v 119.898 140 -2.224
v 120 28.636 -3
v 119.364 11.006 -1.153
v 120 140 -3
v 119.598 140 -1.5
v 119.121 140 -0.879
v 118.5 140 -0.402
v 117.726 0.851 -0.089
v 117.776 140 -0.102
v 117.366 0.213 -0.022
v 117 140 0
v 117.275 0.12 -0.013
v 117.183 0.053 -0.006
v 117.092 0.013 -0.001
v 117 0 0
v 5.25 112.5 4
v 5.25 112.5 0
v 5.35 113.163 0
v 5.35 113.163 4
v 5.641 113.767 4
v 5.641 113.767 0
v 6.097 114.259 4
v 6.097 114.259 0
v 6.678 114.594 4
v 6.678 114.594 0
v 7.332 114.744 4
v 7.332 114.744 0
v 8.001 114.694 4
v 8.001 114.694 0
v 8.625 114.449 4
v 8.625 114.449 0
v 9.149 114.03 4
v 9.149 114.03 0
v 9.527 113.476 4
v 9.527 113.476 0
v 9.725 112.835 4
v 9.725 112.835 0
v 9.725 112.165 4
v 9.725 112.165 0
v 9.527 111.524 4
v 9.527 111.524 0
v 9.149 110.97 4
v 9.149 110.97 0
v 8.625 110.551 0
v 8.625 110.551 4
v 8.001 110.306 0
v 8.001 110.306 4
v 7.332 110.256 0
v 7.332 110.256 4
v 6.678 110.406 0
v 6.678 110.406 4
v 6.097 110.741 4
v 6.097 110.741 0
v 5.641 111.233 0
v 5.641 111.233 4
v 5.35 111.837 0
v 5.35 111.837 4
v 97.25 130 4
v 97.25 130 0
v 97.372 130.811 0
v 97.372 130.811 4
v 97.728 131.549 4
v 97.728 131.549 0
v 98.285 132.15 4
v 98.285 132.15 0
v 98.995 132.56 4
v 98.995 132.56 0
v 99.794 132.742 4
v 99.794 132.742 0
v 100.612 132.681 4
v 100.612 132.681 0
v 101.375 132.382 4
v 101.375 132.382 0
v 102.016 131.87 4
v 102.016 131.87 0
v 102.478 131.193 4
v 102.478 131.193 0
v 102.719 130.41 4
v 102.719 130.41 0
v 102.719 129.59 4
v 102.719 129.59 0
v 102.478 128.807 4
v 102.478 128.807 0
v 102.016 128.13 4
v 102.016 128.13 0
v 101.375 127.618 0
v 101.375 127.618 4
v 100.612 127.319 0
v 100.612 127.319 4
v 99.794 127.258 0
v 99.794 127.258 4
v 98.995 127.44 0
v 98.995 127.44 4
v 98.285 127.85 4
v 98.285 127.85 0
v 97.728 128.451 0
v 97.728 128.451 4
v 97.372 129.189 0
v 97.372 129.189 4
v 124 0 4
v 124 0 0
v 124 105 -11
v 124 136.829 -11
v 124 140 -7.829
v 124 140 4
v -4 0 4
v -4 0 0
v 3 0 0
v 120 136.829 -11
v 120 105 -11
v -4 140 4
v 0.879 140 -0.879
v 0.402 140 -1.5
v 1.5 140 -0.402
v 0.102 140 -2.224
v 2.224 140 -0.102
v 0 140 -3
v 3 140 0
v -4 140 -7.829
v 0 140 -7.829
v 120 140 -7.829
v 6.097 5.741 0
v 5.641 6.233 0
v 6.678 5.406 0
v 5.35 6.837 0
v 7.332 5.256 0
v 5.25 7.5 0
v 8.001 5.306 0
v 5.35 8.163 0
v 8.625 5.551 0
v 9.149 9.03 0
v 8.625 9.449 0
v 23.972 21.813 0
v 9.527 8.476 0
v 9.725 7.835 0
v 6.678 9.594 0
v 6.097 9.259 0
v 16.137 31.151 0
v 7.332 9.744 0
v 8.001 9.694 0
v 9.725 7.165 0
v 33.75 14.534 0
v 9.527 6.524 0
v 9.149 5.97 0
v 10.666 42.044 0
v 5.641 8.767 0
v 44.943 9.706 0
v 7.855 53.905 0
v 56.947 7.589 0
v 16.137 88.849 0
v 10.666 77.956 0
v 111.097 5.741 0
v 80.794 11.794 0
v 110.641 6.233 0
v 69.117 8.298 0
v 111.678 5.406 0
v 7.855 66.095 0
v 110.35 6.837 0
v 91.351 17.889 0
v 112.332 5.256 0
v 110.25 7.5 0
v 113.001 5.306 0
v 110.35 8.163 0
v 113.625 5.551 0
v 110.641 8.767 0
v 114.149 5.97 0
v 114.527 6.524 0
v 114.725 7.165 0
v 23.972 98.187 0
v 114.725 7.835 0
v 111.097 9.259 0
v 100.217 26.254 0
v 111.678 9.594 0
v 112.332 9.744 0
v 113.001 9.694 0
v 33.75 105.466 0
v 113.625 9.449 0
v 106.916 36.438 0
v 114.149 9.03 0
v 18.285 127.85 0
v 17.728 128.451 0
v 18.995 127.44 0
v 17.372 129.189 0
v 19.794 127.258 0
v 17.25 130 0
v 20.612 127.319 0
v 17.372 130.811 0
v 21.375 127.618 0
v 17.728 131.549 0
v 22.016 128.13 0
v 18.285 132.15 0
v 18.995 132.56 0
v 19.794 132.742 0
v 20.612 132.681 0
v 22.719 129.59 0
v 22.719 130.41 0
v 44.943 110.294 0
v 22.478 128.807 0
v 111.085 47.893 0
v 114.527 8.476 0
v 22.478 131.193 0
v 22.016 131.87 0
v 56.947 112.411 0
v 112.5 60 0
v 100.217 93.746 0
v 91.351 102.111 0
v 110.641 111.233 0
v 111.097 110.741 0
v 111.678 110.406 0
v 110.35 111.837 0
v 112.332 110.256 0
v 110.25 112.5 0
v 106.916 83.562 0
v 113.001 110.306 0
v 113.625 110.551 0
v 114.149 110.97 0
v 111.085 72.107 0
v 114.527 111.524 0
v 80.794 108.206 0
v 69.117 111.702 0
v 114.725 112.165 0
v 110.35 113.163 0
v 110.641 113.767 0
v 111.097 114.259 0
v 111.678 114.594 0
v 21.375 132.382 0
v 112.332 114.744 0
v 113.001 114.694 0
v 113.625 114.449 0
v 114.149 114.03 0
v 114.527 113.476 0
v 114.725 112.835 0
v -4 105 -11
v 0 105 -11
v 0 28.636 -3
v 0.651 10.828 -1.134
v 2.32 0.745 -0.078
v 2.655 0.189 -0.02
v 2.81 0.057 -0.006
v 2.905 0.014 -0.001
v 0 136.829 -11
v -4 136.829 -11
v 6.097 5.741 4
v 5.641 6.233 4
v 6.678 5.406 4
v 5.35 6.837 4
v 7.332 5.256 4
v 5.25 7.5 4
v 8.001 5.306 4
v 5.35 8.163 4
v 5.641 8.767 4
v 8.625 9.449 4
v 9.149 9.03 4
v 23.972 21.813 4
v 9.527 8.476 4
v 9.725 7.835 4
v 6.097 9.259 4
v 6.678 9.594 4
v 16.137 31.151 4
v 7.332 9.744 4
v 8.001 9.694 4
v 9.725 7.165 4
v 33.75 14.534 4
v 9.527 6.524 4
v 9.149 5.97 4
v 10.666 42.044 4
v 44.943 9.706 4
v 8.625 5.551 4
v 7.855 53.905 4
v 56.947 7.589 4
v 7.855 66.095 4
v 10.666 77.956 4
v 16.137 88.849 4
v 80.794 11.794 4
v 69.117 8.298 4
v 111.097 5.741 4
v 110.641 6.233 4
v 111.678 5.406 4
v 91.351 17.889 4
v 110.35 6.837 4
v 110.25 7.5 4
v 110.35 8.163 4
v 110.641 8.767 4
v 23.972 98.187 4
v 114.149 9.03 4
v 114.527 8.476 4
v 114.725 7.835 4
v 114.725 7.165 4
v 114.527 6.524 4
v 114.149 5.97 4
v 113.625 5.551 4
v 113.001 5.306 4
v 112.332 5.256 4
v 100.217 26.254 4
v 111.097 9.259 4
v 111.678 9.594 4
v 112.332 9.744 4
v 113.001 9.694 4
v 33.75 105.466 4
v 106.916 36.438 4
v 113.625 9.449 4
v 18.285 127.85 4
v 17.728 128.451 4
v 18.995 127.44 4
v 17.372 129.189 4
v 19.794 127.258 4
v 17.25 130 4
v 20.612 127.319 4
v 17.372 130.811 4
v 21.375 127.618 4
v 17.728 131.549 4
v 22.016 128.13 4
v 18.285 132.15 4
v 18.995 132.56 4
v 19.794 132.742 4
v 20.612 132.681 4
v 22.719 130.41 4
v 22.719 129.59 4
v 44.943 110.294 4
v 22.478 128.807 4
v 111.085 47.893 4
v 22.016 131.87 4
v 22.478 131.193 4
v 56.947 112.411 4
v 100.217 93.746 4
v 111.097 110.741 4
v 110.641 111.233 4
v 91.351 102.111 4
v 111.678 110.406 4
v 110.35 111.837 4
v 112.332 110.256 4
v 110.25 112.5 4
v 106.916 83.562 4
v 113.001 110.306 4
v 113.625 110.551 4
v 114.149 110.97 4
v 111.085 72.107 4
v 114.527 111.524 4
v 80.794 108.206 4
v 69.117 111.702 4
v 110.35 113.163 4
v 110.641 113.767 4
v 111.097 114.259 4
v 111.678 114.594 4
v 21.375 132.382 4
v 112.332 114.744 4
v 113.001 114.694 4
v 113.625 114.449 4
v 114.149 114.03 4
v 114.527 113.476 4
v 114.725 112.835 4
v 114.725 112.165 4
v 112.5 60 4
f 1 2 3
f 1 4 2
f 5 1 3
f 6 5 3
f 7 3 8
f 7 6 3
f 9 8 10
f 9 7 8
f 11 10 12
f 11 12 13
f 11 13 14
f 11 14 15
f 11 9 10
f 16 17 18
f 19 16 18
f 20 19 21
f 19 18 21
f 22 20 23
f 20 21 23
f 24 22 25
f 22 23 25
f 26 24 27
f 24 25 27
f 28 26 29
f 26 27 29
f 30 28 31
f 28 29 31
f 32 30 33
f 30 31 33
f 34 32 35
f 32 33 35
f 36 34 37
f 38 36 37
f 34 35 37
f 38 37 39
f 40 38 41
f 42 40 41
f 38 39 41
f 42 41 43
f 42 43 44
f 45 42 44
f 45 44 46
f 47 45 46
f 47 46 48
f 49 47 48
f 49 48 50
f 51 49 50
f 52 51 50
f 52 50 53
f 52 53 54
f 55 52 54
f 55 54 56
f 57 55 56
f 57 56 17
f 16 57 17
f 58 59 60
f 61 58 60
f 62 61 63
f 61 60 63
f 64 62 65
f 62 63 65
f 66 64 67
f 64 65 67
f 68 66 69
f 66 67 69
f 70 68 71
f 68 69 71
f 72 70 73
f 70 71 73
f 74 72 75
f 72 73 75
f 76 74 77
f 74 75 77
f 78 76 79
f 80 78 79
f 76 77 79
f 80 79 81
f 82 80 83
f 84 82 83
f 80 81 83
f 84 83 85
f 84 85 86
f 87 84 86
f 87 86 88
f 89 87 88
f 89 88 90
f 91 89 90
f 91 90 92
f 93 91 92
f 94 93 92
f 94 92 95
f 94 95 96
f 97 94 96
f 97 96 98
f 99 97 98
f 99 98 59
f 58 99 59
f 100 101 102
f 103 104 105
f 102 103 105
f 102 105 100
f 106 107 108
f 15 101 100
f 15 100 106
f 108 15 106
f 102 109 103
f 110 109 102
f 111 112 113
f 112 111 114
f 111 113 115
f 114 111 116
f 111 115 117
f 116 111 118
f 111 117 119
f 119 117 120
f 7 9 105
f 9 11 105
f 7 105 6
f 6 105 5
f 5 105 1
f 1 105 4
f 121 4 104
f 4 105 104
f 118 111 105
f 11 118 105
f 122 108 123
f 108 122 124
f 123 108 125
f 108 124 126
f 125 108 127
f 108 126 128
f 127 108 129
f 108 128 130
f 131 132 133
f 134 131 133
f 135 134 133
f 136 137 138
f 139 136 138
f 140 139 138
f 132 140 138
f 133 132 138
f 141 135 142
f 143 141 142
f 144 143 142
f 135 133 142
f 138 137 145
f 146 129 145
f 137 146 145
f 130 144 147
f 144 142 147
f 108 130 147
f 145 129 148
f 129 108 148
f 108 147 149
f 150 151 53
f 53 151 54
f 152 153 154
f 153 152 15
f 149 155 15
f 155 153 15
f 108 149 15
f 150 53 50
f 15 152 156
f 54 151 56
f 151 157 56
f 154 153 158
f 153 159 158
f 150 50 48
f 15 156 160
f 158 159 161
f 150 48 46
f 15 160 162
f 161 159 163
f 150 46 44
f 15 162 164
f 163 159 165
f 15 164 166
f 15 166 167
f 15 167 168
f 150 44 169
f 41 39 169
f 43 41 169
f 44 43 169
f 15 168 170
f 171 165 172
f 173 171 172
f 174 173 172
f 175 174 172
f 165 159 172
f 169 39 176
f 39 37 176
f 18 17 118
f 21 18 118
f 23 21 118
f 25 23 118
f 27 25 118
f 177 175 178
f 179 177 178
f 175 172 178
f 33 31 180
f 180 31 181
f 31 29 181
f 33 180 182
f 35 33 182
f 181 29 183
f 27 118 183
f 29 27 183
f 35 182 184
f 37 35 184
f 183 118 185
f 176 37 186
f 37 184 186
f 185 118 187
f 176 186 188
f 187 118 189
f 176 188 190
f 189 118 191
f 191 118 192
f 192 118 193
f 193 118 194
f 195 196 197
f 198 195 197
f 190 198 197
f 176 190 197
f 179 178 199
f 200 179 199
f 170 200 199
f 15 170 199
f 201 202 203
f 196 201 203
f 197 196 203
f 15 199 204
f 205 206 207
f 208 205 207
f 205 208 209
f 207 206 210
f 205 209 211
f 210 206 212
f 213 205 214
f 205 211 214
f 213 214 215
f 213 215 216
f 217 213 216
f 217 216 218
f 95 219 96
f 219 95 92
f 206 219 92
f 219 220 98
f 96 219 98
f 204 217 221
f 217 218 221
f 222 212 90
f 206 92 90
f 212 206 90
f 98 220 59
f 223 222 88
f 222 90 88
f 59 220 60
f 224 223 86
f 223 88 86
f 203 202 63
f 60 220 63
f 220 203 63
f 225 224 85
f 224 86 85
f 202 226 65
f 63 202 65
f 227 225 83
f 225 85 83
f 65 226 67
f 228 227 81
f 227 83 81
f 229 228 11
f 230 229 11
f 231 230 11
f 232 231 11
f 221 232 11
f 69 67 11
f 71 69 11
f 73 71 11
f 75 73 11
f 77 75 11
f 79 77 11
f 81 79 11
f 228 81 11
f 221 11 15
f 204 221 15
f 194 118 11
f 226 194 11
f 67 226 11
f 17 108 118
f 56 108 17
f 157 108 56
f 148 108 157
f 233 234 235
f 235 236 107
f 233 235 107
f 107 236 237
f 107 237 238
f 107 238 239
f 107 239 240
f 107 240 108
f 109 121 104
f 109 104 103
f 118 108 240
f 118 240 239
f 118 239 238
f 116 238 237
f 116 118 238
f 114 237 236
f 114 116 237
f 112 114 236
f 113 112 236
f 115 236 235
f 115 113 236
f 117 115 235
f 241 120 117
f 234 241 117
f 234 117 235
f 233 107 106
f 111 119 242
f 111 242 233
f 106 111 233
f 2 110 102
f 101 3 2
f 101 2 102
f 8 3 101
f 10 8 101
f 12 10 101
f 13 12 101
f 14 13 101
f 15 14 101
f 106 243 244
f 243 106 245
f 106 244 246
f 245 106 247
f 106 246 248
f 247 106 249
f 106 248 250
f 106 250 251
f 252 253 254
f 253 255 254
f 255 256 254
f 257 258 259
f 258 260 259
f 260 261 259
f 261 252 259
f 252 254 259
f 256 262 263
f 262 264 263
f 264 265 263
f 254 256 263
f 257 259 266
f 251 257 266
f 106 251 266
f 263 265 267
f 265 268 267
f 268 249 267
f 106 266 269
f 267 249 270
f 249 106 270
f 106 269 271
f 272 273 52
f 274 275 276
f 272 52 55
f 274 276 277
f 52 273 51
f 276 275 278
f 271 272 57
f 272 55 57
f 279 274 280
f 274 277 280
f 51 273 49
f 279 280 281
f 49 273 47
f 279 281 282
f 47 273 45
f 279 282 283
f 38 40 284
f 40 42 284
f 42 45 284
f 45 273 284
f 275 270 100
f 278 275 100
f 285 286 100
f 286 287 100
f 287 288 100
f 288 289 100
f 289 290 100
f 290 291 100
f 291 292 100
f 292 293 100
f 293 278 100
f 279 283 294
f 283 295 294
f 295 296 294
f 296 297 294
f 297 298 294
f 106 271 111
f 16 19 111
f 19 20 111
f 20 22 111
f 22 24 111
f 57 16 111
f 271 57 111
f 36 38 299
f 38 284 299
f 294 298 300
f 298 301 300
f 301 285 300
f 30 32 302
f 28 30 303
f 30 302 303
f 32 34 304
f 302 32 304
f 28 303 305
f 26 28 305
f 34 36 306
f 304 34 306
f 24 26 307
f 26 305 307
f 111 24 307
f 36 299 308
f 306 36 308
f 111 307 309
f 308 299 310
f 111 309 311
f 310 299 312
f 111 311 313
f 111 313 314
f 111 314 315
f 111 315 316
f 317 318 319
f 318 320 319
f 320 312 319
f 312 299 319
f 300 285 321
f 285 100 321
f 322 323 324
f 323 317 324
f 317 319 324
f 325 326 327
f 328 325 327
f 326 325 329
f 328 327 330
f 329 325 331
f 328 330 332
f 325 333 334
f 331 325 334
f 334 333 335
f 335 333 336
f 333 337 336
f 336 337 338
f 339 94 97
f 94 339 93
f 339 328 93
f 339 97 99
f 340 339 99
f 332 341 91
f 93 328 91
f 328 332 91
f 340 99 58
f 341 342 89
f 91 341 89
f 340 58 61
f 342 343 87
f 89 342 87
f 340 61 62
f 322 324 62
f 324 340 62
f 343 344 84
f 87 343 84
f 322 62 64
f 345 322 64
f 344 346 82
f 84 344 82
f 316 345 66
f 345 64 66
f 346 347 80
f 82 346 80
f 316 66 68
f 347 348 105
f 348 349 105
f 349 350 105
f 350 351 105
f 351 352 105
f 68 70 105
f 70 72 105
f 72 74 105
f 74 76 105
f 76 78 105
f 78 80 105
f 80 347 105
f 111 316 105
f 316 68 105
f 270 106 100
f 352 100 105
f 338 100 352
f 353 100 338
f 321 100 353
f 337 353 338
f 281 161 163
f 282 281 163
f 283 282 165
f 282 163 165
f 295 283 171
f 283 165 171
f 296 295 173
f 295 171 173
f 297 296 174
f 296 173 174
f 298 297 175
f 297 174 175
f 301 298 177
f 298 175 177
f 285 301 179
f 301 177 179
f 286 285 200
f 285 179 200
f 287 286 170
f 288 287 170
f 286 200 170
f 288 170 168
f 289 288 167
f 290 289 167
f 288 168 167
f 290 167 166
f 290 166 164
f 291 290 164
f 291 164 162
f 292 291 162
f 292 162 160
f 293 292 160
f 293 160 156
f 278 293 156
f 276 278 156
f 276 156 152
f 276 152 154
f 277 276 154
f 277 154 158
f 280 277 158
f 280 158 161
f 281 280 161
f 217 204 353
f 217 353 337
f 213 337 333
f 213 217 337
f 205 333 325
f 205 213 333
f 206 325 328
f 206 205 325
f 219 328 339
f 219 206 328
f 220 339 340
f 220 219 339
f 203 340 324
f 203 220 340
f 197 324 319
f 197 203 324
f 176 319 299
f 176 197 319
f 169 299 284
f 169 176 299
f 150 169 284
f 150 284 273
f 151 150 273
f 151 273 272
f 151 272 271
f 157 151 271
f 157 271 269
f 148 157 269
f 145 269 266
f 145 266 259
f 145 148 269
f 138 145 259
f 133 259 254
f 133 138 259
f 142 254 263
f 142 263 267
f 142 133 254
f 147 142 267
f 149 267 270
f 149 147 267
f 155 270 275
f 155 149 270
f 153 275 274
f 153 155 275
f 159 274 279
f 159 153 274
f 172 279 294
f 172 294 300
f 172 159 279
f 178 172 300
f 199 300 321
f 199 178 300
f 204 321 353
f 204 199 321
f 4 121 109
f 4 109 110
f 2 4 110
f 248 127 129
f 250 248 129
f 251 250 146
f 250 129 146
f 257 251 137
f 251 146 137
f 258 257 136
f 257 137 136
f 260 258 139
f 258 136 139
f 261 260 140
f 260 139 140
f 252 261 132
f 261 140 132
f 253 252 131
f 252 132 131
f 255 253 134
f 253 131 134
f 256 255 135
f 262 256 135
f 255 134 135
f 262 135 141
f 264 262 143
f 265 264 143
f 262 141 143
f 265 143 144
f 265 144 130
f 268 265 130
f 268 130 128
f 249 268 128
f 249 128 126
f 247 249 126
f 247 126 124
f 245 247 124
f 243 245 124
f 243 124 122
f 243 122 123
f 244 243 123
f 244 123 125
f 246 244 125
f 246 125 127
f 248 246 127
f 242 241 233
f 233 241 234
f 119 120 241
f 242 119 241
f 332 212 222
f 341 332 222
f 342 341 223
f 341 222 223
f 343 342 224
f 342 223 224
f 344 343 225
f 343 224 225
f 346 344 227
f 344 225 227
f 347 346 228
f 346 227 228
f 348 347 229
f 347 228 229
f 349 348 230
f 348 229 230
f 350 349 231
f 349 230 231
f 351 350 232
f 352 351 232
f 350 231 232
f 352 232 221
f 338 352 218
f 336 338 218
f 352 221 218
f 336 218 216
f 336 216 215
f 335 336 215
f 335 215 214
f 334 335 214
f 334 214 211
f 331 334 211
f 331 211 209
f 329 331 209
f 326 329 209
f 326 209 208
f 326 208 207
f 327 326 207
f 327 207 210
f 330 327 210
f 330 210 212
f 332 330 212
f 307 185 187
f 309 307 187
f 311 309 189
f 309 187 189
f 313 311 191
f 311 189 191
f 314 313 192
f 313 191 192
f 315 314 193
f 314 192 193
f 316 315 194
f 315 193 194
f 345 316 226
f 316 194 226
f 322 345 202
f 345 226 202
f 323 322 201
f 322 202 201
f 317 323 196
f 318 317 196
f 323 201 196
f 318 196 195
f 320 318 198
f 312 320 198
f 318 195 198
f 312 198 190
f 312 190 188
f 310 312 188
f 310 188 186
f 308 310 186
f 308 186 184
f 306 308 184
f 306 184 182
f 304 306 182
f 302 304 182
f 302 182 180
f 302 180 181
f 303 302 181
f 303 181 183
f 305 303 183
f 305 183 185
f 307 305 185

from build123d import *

# Parameters (mm, degrees)
SKETCH1_W            = 120
SKETCH1_H            = 140
SKETCH1_R            = 52.5
BOSS_EXTRUDE1_DEPTH  = 4
M4_CLEARANCE_HOLE1_D = 4.5
M5_CLEARANCE_HOLE1_D = 5.5
BOSS_EXTRUDE2_DEPTH  = 4
FILLET1_R            = 3


with BuildPart() as part:
    # Sketch1 → Boss-Extrude1 (new body)
    with BuildSketch(Plane.XY):
        with Locations((60, 70)):
            Rectangle(SKETCH1_W, SKETCH1_H)
        with Locations((60, 60)):
            Circle(SKETCH1_R, mode=Mode.SUBTRACT)
    extrude(amount=BOSS_EXTRUDE1_DEPTH)

    # M4 Clearance Hole1 (through all)
    with Locations(Plane.XY.offset(4)):
        with Locations((7.5, 7.5), (60, 60), (7.5, 112.5), (112.5, 112.5), (112.5, 7.5)):
            Hole(M4_CLEARANCE_HOLE1_D / 2)

    # M5 Clearance Hole1 (through all)
    with Locations(Plane.XY.offset(4)):
        with Locations((100, 130), (20, 130)):
            Hole(M5_CLEARANCE_HOLE1_D / 2)

    # Sketch6 → Boss-Extrude2 (add)
    with BuildSketch(Plane(origin=(120, 0, 0), x_dir=(0, 0, -1), z_dir=(1, 0, 0))):
        Polygon((-4, 140), (7.829119834, 140), (11, 136.829119834), (11, 105), (0, 0), (-4, 0), align=None)
    boss_extrude2 = extrude(amount=BOSS_EXTRUDE2_DEPTH)

    # Mirror1: Boss-Extrude2 across plane
    add(boss_extrude2.mirror(Plane.ZY.offset(-60)))

    # Fillet1
    fillet1_edges = [part.edges().sort_by_distance(p)[0] for p in [
        (120, 70, 0),
        (0, 70, 0),
    ]]
    fillet(fillet1_edges, radius=FILLET1_R)


solid = part.part
